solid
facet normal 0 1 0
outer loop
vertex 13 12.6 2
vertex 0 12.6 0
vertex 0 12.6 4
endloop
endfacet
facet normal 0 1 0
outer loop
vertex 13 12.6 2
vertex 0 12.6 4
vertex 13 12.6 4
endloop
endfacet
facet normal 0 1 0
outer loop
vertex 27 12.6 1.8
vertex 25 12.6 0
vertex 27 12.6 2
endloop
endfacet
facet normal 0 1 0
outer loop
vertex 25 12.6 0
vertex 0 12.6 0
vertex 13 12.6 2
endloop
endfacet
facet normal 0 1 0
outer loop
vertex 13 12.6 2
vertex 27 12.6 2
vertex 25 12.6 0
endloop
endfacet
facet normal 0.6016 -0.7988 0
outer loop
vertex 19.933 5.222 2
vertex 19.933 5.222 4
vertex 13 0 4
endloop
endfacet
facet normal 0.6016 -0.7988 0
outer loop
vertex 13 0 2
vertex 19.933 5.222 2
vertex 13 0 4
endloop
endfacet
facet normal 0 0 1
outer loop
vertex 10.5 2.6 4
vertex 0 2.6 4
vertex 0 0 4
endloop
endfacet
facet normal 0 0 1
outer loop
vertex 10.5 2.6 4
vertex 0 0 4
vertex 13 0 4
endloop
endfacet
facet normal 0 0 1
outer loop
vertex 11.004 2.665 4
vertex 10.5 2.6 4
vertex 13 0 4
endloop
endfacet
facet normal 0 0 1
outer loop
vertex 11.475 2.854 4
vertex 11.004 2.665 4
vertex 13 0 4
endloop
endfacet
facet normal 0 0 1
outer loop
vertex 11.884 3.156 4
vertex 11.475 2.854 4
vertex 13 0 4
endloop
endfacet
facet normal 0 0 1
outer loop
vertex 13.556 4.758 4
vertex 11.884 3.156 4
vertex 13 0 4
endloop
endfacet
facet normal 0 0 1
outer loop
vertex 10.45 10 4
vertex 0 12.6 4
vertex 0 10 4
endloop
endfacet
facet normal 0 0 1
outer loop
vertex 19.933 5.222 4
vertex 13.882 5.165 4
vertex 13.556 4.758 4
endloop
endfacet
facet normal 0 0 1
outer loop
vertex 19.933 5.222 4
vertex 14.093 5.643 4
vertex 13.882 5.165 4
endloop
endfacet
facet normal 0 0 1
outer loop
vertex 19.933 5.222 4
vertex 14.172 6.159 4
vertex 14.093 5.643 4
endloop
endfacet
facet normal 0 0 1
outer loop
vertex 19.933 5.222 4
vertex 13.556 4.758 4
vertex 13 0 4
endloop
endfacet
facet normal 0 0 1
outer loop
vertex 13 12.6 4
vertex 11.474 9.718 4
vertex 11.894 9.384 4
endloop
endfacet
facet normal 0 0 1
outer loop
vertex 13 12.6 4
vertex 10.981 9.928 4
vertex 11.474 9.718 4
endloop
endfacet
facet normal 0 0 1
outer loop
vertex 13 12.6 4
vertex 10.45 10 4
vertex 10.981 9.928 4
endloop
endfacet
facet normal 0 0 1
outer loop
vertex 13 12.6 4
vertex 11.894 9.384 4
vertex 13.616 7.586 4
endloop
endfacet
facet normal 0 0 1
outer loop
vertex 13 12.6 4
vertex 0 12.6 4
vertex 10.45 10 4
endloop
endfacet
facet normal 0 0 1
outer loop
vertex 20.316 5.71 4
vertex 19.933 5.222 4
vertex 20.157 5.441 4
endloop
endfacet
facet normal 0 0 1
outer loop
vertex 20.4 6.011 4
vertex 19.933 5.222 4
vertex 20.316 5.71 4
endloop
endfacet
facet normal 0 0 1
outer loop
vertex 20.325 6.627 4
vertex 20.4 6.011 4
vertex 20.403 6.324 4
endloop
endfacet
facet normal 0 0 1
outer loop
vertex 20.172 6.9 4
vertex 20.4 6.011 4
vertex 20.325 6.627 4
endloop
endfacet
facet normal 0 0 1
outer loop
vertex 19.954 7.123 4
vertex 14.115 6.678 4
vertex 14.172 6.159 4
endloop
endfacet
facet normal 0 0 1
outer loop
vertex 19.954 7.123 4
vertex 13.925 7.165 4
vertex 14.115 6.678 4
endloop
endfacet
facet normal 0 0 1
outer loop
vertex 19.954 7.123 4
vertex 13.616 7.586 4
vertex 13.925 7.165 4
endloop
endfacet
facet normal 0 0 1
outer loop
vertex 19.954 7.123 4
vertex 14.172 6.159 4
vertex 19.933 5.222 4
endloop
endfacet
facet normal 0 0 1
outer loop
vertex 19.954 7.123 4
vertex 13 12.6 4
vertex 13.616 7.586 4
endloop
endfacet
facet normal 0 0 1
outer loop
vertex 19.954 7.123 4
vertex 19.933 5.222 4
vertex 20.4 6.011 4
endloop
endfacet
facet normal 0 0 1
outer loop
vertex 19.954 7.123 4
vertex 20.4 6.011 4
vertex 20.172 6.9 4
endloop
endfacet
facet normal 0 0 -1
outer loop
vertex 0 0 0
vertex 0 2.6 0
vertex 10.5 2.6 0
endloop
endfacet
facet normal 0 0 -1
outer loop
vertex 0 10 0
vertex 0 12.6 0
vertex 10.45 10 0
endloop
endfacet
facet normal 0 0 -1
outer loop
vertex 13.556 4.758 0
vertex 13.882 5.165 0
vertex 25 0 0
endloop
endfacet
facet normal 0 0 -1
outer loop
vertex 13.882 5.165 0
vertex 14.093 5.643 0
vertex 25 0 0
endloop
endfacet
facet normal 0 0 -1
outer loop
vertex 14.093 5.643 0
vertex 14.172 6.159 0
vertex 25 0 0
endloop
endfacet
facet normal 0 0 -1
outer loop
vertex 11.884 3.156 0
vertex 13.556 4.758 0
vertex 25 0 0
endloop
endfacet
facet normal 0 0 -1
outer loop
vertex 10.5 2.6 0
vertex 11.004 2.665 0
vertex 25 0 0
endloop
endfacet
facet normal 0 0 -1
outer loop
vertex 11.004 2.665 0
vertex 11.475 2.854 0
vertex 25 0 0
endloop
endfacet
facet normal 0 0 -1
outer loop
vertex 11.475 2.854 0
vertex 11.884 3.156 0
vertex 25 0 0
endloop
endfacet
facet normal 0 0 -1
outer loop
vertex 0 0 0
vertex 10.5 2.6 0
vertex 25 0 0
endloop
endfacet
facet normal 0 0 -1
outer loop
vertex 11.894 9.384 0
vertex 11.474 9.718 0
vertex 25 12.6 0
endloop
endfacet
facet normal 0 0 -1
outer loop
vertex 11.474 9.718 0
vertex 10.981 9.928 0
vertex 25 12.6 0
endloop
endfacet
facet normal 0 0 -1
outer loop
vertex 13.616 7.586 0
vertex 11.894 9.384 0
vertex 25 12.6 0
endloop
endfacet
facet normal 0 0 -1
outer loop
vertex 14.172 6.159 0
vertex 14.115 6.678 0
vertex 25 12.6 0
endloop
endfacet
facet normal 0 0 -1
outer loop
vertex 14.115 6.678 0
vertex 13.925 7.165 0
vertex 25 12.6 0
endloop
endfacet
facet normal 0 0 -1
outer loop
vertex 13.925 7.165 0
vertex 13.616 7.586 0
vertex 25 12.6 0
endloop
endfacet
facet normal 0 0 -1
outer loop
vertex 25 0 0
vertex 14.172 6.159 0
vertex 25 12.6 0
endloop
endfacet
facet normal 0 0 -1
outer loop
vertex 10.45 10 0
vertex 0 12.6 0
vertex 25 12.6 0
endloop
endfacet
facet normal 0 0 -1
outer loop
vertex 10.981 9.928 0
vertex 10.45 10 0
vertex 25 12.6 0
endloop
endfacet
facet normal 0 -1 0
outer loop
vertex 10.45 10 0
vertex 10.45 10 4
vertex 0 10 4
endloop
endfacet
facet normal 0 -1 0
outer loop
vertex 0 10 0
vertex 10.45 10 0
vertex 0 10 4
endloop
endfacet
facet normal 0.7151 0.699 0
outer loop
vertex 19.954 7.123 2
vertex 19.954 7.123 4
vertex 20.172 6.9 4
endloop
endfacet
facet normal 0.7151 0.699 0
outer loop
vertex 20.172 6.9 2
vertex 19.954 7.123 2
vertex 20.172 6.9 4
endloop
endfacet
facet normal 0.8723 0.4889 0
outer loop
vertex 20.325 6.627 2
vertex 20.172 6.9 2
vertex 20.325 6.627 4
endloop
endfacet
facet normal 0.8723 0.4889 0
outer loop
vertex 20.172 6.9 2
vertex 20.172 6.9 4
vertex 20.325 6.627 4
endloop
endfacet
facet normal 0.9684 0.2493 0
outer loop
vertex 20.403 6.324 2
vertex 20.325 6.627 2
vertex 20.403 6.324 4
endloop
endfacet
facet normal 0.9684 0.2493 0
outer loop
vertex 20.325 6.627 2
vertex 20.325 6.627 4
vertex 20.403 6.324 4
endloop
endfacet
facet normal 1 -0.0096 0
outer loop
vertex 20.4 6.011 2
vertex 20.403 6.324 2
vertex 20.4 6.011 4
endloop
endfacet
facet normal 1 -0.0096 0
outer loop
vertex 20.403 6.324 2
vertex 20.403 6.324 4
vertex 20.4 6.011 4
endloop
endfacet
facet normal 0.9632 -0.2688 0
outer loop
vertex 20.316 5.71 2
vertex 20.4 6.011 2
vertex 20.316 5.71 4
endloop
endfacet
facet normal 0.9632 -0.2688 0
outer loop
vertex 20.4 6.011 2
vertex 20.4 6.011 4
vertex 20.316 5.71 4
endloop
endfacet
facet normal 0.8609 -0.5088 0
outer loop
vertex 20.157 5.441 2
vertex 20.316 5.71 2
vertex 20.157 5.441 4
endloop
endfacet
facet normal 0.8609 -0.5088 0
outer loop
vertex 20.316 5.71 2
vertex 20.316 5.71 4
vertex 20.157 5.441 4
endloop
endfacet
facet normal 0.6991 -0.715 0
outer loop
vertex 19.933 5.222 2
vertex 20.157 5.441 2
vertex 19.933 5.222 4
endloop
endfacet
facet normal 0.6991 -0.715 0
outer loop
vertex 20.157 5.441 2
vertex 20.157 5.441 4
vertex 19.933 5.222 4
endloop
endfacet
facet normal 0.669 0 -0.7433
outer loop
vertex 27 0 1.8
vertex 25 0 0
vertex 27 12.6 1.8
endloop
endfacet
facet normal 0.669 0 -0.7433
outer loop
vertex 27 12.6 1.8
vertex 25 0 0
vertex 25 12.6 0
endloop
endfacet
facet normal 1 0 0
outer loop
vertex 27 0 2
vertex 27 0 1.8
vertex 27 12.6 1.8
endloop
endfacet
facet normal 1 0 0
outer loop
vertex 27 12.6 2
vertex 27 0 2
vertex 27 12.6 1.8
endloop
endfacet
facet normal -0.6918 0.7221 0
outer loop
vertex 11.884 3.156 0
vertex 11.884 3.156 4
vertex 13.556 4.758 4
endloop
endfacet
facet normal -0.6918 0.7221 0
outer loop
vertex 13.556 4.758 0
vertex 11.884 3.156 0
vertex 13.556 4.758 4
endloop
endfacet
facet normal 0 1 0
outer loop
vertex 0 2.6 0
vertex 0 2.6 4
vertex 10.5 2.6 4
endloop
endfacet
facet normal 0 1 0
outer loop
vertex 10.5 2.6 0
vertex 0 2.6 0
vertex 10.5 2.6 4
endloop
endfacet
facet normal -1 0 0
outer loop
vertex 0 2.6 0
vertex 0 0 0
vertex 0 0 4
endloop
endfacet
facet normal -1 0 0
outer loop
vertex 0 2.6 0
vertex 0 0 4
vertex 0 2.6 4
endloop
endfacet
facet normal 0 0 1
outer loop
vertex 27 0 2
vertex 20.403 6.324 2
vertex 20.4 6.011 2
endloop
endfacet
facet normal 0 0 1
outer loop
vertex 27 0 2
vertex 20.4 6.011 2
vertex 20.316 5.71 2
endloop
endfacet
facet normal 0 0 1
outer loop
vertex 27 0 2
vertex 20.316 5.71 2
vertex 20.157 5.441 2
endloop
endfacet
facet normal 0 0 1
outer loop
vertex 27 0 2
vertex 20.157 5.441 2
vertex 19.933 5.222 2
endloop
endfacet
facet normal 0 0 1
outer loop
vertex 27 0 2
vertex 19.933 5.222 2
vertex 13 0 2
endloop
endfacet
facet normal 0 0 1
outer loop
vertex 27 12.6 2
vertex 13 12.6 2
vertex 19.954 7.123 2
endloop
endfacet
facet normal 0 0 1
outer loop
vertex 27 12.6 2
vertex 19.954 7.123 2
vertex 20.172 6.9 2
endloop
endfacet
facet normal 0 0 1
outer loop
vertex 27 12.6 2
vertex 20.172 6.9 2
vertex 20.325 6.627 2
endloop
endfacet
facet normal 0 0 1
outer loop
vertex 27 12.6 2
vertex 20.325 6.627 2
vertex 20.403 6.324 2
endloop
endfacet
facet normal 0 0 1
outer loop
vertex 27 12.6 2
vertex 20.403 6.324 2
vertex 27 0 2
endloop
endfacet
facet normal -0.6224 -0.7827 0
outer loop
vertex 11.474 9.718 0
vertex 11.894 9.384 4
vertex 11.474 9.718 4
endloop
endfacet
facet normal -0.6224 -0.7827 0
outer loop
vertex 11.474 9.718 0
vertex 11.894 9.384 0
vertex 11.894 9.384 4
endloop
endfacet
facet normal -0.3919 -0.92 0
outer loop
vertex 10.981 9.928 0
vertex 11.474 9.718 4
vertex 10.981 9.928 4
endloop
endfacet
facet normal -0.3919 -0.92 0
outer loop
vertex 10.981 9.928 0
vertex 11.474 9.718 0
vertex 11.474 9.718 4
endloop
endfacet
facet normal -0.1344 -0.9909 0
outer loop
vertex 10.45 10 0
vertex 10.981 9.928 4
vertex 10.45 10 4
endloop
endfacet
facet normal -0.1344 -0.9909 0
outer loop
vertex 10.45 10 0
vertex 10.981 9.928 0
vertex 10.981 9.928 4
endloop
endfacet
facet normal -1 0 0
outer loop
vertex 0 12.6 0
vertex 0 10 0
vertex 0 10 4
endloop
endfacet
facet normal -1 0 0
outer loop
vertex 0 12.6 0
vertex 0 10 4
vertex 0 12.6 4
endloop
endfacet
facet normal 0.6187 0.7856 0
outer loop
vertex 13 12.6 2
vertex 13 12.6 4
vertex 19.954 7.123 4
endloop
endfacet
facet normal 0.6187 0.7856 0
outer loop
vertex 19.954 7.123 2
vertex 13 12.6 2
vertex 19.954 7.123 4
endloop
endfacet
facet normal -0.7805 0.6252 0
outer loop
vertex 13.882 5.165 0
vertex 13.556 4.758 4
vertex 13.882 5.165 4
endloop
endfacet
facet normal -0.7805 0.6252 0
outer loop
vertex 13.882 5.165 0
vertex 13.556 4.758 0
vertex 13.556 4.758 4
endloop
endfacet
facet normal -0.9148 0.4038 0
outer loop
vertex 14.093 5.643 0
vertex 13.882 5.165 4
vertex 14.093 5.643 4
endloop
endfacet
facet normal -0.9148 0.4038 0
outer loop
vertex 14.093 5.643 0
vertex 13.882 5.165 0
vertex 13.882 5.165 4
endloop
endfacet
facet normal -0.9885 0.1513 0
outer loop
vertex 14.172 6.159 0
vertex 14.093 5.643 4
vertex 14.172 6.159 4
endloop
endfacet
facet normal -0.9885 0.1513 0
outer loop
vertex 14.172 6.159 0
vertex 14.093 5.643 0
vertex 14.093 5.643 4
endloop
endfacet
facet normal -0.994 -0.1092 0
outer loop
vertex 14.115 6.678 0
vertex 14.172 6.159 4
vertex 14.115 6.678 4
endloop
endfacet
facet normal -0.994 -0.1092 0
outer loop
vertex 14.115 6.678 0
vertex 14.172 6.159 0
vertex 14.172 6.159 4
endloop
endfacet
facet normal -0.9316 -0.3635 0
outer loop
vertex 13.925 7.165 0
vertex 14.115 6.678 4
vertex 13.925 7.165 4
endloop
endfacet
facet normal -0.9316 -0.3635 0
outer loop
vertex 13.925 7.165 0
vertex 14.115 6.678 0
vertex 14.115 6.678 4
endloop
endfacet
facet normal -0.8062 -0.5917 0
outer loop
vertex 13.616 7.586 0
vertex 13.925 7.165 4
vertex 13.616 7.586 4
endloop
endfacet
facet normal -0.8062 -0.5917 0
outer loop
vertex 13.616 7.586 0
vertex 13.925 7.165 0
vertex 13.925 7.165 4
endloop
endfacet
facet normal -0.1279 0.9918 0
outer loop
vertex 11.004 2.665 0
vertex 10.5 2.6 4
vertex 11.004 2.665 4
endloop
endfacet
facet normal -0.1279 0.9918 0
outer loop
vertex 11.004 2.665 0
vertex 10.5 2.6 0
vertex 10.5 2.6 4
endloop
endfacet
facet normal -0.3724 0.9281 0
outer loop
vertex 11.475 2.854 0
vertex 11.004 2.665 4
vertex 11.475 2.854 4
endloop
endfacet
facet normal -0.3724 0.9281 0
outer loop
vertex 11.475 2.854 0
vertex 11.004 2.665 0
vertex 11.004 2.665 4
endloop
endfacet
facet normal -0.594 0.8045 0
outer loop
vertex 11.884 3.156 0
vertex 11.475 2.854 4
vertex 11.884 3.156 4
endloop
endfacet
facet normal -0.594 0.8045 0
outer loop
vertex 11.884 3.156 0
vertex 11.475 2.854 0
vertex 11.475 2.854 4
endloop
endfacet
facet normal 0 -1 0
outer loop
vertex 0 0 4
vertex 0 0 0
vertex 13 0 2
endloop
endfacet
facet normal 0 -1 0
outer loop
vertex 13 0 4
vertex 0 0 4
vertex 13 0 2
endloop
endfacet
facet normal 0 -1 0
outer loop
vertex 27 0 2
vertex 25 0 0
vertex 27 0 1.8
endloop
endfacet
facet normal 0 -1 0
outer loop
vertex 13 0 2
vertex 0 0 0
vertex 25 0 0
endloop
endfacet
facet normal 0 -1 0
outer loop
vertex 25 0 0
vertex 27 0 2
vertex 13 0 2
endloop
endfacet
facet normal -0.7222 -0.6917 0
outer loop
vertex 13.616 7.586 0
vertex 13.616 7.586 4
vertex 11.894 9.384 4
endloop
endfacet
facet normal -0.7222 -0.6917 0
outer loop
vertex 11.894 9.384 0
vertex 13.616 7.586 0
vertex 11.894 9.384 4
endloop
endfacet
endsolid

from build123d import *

# Parameters (mm, degrees)
F0_W     = 27
F0_H     = 12.6
F1_DEPTH = 4
F3_DEPTH = 25
F4_R     = 2
F6_DEPTH = 2
F7_SIZE2 = 2
F7_SIZE  = 1.8


with BuildPart() as f1:
    # F0 (on Top) → F1 (new body)
    with BuildSketch(Plane.XY):
        with Locations((13.5, 6.3)):
            Rectangle(F0_W, F0_H)
    extrude(amount=F1_DEPTH)

    # F2 (on face) → F3 (cut)
    with BuildSketch(Plane.XY.offset(4)):
        Polygon((11.3033894163, 10), (0, 10), (0, 2.6), (11.3033894163, 2.6), (15, 6.1416643043), align=None)
    extrude(amount=-F3_DEPTH, mode=Mode.SUBTRACT)

    # F4
    f4_edges = [f1.edges().sort_by_distance(p)[0] for p in [
        (11.303389, 10, 2),
        (15, 6.141664, 2),
        (11.303389, 2.6, 2),
    ]]
    fillet(f4_edges, radius=F4_R)

    # F5 (on face) → F6 (cut)
    with BuildSketch(Plane.XY.offset(4)):
        with BuildLine():
            Line((27, 12.6), (13, 12.6))
            Line((13, 12.6), (19.9540073999, 7.1233526669))
            ThreePointArc((19.9540073999, 7.1233526669), (20.4114805586, 6.1676652225), (19.9334913588, 5.2220720186))
            Line((19.9334913588, 5.2220720186), (13, 0))
            Line((13, 0), (27, 0))
            Line((27, 0), (27, 12.6))
        make_face()
    extrude(amount=-F6_DEPTH, mode=Mode.SUBTRACT)

    # F7
    f7_edges = [f1.edges().sort_by_distance(p)[0] for p in [
        (27, 6.3, 0),
    ]]
    f7_side = f1.faces().sort_by_distance((27, 6.3, 1))[0]
    chamfer(f7_edges, length=F7_SIZE, length2=F7_SIZE2, reference=f7_side)


solid = f1.part
